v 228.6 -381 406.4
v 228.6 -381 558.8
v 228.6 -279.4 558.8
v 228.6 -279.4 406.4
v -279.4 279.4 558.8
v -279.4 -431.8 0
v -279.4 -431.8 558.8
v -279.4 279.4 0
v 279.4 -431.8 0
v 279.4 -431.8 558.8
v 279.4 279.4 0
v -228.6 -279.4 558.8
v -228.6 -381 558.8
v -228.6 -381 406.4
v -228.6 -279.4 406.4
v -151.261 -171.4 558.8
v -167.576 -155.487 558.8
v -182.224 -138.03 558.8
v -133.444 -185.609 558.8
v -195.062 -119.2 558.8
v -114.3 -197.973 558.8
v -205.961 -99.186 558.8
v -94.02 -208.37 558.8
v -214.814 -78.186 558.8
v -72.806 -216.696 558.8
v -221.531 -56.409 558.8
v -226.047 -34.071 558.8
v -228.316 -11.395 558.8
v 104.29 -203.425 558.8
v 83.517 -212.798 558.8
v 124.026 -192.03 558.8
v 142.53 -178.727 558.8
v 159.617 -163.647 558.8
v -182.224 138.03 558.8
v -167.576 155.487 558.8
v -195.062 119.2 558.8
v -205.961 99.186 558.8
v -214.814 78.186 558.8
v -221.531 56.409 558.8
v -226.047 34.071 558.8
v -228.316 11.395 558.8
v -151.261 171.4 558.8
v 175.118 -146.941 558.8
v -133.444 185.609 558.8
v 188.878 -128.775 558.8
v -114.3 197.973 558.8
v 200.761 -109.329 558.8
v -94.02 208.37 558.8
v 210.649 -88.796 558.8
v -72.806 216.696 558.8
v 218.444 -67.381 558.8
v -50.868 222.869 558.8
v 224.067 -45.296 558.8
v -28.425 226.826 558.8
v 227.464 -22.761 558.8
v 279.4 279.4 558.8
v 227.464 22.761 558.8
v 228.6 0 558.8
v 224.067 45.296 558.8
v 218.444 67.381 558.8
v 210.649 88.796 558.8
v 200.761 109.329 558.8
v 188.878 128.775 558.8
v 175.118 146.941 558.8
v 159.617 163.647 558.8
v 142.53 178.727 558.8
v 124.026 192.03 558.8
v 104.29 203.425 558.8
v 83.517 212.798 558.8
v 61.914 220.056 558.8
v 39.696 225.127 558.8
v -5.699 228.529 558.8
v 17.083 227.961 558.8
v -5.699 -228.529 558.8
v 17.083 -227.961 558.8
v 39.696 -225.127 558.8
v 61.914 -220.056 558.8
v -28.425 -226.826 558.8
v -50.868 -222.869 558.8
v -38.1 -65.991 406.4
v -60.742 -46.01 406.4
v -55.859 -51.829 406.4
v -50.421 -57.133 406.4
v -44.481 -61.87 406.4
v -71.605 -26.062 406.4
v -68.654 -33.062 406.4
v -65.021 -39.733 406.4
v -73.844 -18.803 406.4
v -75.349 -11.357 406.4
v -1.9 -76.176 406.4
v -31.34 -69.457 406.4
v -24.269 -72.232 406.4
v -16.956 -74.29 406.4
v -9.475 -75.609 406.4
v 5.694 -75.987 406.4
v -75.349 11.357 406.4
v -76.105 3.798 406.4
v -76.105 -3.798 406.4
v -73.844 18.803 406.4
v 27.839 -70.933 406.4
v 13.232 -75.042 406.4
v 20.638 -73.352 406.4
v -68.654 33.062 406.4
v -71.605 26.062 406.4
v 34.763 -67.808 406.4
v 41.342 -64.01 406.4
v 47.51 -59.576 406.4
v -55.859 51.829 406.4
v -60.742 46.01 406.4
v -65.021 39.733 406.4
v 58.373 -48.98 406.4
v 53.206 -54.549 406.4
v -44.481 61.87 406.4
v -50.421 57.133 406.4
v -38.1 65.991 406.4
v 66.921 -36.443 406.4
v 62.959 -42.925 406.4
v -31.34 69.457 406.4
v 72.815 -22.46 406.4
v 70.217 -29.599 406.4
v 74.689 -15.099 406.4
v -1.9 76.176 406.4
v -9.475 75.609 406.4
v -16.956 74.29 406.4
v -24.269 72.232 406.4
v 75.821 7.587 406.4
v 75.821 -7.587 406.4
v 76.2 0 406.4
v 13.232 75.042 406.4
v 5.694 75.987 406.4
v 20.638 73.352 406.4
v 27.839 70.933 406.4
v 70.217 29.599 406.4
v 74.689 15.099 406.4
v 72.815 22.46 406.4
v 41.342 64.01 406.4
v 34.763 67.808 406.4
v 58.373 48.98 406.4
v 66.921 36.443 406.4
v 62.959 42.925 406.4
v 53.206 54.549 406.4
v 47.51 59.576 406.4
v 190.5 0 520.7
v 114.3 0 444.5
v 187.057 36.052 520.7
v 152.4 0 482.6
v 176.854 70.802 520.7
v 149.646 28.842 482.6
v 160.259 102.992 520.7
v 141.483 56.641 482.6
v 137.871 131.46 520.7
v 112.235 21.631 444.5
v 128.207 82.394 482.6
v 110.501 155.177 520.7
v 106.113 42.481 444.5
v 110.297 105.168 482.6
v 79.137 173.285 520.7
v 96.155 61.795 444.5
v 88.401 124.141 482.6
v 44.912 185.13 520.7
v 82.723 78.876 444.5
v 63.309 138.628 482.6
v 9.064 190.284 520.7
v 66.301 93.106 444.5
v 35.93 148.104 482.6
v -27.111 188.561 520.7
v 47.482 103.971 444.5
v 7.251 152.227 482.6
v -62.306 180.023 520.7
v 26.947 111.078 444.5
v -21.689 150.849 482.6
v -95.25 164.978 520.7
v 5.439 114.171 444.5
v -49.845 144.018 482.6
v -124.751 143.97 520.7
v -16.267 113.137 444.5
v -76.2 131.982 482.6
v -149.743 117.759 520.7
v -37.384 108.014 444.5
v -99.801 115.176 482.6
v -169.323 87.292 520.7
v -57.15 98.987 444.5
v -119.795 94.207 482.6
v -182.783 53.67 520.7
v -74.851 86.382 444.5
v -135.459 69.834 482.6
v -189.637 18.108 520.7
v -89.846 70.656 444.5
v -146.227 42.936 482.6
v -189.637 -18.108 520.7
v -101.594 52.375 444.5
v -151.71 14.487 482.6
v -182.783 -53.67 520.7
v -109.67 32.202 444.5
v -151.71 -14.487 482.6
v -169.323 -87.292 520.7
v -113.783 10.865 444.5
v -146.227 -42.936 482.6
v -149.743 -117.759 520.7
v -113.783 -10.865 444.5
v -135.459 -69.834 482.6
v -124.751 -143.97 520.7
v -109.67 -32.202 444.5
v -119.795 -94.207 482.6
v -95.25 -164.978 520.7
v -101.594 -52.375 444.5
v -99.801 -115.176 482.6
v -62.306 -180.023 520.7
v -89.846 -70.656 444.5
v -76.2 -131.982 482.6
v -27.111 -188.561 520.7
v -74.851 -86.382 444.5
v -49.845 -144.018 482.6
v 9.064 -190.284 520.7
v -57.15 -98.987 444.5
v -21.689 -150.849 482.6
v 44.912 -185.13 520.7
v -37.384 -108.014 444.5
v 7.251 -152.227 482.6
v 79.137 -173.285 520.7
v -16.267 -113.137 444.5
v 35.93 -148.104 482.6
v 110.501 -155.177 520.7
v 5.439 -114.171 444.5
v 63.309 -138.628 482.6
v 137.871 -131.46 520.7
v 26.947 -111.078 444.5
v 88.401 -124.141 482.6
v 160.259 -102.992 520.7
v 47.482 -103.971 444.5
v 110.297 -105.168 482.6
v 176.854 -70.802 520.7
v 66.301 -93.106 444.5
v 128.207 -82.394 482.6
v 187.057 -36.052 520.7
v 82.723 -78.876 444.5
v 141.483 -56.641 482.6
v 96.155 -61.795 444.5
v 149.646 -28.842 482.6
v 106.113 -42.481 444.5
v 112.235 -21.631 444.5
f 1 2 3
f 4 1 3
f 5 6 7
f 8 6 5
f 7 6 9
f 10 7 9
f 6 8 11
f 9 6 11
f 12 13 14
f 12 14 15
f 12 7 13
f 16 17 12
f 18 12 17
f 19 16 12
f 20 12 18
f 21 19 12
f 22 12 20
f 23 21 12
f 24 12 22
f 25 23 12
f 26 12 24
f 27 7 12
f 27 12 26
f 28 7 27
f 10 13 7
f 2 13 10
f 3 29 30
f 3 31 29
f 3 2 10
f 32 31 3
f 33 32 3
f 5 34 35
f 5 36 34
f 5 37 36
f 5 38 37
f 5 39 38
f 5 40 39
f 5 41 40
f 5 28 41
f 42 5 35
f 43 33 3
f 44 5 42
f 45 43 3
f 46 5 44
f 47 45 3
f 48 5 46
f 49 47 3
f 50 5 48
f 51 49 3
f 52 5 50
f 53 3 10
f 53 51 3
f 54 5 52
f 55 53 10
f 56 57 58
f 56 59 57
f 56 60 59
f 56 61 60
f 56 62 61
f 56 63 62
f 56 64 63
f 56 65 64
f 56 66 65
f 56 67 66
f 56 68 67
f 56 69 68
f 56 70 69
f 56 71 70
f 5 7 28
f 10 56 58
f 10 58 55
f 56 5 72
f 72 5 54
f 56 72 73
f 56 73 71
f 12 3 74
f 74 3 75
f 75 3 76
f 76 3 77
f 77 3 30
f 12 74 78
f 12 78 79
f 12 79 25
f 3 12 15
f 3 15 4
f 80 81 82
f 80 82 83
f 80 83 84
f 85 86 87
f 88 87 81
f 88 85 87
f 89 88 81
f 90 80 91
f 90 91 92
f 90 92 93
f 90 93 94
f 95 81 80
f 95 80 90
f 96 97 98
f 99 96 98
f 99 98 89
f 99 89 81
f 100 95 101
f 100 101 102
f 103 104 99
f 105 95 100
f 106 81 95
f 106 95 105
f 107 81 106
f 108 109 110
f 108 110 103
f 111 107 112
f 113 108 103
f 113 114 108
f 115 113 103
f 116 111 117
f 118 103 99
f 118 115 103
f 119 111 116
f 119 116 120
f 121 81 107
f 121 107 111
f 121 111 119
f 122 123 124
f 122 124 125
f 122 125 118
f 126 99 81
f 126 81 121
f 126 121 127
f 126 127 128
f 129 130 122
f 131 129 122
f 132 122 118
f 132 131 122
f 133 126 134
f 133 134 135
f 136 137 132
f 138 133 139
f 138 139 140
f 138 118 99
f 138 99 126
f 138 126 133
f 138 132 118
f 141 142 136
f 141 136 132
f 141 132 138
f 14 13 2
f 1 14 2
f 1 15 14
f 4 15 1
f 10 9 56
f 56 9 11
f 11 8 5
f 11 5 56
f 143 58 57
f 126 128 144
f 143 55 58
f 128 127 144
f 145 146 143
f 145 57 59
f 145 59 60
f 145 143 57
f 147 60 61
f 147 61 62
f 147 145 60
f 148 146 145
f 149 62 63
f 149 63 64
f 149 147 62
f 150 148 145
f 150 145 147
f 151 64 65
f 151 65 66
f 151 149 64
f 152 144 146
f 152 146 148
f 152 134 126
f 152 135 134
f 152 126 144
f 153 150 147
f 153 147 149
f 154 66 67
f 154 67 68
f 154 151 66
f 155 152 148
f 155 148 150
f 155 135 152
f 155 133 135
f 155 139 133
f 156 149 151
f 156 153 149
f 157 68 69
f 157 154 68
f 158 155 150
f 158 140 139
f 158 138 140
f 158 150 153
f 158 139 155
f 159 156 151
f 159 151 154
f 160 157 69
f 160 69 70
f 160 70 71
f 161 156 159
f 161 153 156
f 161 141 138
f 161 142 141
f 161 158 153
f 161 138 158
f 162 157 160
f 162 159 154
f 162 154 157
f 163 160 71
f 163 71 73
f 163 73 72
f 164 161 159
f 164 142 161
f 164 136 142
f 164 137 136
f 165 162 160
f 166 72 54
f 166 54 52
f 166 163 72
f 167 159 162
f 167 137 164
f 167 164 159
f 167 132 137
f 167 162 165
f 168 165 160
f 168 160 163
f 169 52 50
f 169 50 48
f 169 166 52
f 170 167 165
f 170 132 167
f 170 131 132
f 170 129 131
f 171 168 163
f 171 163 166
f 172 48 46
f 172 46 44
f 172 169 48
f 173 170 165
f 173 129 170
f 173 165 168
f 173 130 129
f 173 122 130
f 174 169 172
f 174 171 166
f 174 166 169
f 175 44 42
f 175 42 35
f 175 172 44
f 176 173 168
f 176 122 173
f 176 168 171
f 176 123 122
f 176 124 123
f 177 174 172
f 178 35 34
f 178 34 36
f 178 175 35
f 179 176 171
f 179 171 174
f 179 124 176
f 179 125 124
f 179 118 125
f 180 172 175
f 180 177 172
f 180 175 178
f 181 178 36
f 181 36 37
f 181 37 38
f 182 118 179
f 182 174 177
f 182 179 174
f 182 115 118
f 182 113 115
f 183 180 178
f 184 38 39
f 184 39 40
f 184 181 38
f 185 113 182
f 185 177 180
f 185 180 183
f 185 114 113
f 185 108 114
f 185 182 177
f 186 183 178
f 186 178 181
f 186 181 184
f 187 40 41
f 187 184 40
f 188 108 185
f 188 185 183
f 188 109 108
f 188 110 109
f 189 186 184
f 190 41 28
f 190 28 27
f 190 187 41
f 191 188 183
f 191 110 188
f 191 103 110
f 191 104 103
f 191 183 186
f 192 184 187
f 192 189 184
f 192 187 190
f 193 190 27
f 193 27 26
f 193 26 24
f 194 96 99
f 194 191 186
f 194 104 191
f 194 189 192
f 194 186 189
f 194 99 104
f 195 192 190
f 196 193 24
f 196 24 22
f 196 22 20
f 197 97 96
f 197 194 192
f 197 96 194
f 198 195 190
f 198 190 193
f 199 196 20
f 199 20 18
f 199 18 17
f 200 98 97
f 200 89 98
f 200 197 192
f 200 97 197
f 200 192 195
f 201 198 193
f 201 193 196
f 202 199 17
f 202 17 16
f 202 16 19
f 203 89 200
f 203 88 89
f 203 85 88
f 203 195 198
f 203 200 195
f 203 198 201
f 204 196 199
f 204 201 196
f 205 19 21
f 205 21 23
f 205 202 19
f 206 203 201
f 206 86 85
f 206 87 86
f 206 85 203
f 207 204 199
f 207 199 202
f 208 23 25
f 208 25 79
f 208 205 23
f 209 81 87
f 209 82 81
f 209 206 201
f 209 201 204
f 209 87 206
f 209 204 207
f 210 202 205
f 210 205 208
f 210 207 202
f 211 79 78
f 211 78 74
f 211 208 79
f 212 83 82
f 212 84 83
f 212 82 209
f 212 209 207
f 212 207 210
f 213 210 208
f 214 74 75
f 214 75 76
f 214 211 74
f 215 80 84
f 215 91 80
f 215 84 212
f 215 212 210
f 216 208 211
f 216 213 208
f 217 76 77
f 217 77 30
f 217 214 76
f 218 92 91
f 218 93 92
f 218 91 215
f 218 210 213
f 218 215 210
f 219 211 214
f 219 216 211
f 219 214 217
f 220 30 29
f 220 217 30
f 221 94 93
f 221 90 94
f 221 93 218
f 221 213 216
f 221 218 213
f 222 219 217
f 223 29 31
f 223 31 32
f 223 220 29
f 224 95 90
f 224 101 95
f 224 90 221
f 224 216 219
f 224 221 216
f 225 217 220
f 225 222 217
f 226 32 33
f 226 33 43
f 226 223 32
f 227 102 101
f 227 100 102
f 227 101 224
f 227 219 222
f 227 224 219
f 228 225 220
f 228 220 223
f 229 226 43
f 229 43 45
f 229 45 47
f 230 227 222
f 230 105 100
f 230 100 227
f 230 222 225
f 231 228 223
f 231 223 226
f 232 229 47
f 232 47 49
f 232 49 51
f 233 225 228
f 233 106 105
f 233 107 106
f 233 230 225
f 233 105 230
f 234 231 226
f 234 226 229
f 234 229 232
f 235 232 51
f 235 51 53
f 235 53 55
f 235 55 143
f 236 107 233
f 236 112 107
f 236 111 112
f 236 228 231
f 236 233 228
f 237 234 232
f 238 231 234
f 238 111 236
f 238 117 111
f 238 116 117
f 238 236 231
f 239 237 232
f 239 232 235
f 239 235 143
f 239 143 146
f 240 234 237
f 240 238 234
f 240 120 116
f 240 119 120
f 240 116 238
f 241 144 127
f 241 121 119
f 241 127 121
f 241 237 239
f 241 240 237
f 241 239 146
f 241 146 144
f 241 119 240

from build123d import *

# Parameters (mm, degrees)
SKETCH1_W           = 558.8
SKETCH1_H           = 711.2
BOSS_EXTRUDE1_DEPTH = 558.8
SKETCH2_R           = 228.6
SKETCH2_W           = 457.2
SKETCH2_H           = 101.6
CUT_EXTRUDE1_DEPTH  = 152.4
CHAMFER1_SIZE       = 152.4


with BuildPart() as part:
    # Sketch1 → Boss-Extrude1 (new body)
    with BuildSketch(Plane.XY):
        with Locations((0, -76.2)):
            Rectangle(SKETCH1_W, SKETCH1_H)
    extrude(amount=BOSS_EXTRUDE1_DEPTH)

    # Sketch2 → Cut-Extrude1 (cut)
    with BuildSketch(Plane.XY.offset(558.8)):
        Circle(SKETCH2_R)
        with Locations((0, -330.2)):
            Rectangle(SKETCH2_W, SKETCH2_H)
    extrude(amount=-CUT_EXTRUDE1_DEPTH, mode=Mode.SUBTRACT)

    # Chamfer1
    chamfer1_edges = [part.edges().sort_by_distance(p)[0] for p in [
        (-228.6, 0, 406.4),
    ]]
    chamfer(chamfer1_edges, length=CHAMFER1_SIZE - 0.0001)  # a hair under: the kernel refuses the full size


solid = part.part
